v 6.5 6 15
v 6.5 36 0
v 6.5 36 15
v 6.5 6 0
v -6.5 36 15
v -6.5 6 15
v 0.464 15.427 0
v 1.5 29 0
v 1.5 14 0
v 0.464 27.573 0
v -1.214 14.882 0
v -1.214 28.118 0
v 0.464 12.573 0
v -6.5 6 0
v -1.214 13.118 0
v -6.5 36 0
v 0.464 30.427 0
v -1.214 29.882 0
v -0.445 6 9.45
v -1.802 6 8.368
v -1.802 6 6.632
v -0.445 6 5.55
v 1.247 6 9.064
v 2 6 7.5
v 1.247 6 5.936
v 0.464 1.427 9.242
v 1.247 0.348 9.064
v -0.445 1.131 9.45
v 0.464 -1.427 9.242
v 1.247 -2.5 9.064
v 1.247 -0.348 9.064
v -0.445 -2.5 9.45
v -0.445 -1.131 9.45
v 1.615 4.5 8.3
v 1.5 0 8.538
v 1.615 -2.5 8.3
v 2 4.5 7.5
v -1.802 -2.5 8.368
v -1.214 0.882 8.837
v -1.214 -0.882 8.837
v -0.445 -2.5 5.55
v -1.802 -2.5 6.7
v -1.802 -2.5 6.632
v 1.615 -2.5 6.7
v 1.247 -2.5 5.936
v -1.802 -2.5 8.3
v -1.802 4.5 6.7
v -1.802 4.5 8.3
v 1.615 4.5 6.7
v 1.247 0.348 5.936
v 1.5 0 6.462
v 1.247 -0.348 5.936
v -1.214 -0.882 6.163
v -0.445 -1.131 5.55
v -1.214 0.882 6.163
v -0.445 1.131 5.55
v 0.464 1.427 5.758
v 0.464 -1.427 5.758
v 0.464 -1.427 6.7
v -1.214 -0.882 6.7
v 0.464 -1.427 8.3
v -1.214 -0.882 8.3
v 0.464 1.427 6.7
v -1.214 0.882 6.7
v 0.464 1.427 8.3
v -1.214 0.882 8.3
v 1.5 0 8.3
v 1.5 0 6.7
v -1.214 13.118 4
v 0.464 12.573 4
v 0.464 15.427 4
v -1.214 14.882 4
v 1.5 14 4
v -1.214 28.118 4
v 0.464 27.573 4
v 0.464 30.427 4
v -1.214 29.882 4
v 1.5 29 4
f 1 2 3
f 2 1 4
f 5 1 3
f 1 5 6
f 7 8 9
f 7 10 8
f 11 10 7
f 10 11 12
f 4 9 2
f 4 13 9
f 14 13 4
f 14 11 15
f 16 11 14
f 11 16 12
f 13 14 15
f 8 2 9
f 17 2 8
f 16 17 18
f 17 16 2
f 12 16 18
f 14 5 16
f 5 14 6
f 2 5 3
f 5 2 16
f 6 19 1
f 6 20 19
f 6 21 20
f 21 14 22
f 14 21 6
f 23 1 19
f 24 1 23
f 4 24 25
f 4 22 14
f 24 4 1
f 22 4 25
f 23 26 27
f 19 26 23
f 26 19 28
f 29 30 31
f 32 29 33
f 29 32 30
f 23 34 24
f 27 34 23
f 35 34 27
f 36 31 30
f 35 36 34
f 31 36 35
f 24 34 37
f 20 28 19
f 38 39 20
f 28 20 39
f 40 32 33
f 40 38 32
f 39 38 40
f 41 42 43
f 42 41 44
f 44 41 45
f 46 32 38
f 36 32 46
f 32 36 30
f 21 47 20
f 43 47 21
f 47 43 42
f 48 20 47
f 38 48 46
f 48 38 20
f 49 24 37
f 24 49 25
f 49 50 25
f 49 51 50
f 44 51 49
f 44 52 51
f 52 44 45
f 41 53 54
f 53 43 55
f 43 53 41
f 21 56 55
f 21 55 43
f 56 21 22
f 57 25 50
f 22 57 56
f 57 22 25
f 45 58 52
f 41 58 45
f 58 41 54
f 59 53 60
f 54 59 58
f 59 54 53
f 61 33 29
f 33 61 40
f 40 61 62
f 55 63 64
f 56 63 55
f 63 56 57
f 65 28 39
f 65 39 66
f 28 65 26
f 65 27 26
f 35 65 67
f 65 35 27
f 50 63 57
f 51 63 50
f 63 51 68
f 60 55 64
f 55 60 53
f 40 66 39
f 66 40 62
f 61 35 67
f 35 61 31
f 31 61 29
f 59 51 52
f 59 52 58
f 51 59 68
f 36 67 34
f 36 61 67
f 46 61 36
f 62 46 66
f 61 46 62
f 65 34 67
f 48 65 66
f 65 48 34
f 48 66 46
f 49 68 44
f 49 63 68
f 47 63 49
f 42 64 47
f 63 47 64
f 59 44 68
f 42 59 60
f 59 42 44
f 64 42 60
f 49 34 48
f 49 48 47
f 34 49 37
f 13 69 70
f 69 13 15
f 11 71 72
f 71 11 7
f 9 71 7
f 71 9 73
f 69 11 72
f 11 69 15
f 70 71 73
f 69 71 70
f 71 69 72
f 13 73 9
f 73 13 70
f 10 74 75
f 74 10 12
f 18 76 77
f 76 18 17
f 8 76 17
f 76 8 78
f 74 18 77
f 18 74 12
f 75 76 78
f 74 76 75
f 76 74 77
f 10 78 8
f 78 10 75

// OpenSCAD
// file: global_preferences.scad
color_electronics = [1, 0, 0];
color_hardware = [0, 0, 1];
color_wood = [0.8, 0.6, 0.2];

flipper_rotation_angle = 45; //Degrees rotation when activated.
// file: physical_dimensions.scad
//Physically bound settings.
printing_play = 0.2; //Horizontal error in 3D printing.
printing_overhang = 50; //Maximum overhang angle. 90 is perfect bridging. 0 is no overhang possible.
movement_play = 0.2; //Play to leave if stuff has to move past each other.

m3_bolt_radius = 1.5;
m3_nut_radius = 5.5 / 2;
m3_nut_height = 2.4;

ball_radius = 15; //Standard pinball size (7/6 inch).
ball_slit = ball_radius * 2 + movement_play * 2 + 4; //Allow 4mm extra space to make the ball fall through faster.

cabinet_thickness = 18; //1.8cm wooden planks.
cabinet_plank_width = 196; //Planks are this wide.

flipper_solenoid_width = 13;
flipper_solenoid_height = 15;
flipper_solenoid_length = 30;
flipper_solenoid_pin_radius = 2;
flipper_solenoid_pin_retracted = 8.5; //Length when retracted.
flipper_solenoid_pin_expansion = 10; //Stroke length.
flipper_solenoid_pinhole_position = 2.5; //Distance from centre of hole to tip of pin.
flipper_solenoid_pinhole_radius = m3_bolt_radius;
flipper_solenoid_pingap_thickness = 1.6;
flipper_solenoid_pingap_depth = 7;
flipper_solenoid_screw_radius = m3_bolt_radius;
flipper_solenoid_screw1_position = 8; //Distance from front.
flipper_solenoid_screw2_position = 15 + flipper_solenoid_screw1_position;
flipper_solenoid_screw_depth = 4; //Unknown.

hexkey_radius = 2; //Radius of circumscribed circle around hex key.
hexkey_short_length = 30; //Length of short end.//TODO: How long is this?
hexkey_long_length = 100; //TODO: How long is this?
hexkey_turn_radius = 10; //TODO: Also unknown.

matrix_size = [320, 160]; //Size of LED matrix.

playfield_width = 610;
playfield_height = 1220;
playfield_slope = 6; //Degrees.
playfield_thickness = 18;

solenoid_width = 13;
solenoid_height = 15;
solenoid_length = 30;
solenoid_pin_radius = 2;
solenoid_pin_retracted = 8.5; //Length when retracted.
solenoid_pin_expansion = 10; //Stroke length.
solenoid_pinhole_position = 2.5; //Distance from centre of hole to tip of pin.
solenoid_pinhole_radius = m3_bolt_radius;
solenoid_pingap_thickness = 1.6;
solenoid_pingap_depth = 7;
solenoid_screw_radius = m3_bolt_radius;
solenoid_screw1_position = 8; //Distance from front.
solenoid_screw2_position = 15 + solenoid_screw1_position;
solenoid_screw_depth = 4; //Unknown.

space_bottom = 100;
space_top = 100;
space_top_back = 200;

spring_end_thickness = 2; //How thick the attachment part of the spring is.
spring_radius = 4; //Radius of the coil of the spring.
// main file
include <physical_dimensions.scad>
include <global_preferences.scad>

module solenoid(expansion = 0) {
	color(color_electronics) {
		difference() {
			union() {
				translate([-solenoid_width / 2, solenoid_pin_retracted - solenoid_pinhole_position]) {
					cube([solenoid_width, solenoid_length, solenoid_height]);
				}
				translate([0, solenoid_pin_retracted - solenoid_pinhole_position, solenoid_height / 2]) {
					rotate([90, 0, 0]) {
						cylinder(r=solenoid_pin_radius, h=solenoid_pin_retracted + expansion);
					}
				}
			}
			translate([0, -expansion, 0]) { //Pin hole.
				cylinder(r=solenoid_pinhole_radius, h=solenoid_height);
			}
			translate([-solenoid_pin_radius, -solenoid_pinhole_position - expansion, solenoid_height / 2 - solenoid_pingap_thickness / 2]) {
				cube([solenoid_pin_radius * 2, solenoid_pingap_depth, solenoid_pingap_thickness]);
			}
			translate([0, solenoid_pin_retracted - solenoid_pinhole_position + solenoid_screw1_position, 0]) {
				cylinder(r=solenoid_screw_radius, h=solenoid_screw_depth);
			}
			translate([0, solenoid_pin_retracted - solenoid_pinhole_position + solenoid_screw2_position, 0]) {
				cylinder(r=solenoid_screw_radius, h=solenoid_screw_depth);
			}
		}
	}
}

solenoid($t * 10);
